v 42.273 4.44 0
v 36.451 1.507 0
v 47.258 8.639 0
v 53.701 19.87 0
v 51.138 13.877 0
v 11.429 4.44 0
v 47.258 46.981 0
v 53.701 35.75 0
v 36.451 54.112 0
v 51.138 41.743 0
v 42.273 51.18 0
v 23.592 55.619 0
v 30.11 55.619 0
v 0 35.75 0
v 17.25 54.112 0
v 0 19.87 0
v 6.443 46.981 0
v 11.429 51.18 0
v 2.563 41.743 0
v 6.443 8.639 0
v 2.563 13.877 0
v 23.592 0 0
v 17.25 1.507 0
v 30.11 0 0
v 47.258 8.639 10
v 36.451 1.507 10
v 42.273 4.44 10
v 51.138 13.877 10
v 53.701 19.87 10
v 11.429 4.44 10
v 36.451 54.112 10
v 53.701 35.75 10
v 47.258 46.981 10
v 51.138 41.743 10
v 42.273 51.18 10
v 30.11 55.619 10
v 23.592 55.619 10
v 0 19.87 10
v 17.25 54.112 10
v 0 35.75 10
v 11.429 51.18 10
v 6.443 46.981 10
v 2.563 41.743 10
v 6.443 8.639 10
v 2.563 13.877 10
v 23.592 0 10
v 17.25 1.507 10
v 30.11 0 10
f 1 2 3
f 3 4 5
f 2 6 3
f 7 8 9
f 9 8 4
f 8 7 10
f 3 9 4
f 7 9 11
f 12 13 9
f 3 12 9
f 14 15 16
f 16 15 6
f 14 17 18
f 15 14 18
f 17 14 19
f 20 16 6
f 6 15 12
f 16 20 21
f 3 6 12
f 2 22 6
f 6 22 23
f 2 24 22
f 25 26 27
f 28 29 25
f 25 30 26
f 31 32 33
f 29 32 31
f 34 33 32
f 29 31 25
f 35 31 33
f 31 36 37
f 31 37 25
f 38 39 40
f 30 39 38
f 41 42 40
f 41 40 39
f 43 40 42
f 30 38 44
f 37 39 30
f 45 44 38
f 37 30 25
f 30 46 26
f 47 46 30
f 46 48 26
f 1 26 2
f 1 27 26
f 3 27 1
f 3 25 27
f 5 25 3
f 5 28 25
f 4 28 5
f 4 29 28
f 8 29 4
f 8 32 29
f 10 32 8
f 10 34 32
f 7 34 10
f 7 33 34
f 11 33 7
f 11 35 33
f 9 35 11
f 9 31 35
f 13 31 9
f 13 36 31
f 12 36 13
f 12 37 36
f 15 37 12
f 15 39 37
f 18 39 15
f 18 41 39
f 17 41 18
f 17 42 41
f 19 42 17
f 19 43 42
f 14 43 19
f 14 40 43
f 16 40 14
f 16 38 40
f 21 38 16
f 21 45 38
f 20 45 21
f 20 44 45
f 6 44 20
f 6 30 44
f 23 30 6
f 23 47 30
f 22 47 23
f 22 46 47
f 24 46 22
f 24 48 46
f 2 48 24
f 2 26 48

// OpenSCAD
$fn = 32;

// ----------------------------------------------------------------------
// Flat adaptor: double_d, 10 mm thick
// ----------------------------------------------------------------------

// --- parameters (mm) ---
profile_height = 10;      // extrusion height
profile_points = 24;      // points of the closed outline

profile = [[53.701, 35.75], [51.138, 41.743], [47.258, 46.981], [42.273, 51.18], [36.451, 54.112], [30.11, 55.619], [23.592, 55.619], [17.25, 54.112], [11.429, 51.18], [6.443, 46.981], [2.563, 41.743], [0, 35.75], [0, 19.87], [2.563, 13.877], [6.443, 8.639], [11.429, 4.44], [17.25, 1.507], [23.592, 0], [30.11, 0], [36.451, 1.507], [42.273, 4.44], [47.258, 8.639], [51.138, 13.877], [53.701, 19.87]];  // single closed polygon, 24 points, counter clockwise

// --- the one profile operation ---
linear_extrude(height = profile_height) polygon(points = profile);
